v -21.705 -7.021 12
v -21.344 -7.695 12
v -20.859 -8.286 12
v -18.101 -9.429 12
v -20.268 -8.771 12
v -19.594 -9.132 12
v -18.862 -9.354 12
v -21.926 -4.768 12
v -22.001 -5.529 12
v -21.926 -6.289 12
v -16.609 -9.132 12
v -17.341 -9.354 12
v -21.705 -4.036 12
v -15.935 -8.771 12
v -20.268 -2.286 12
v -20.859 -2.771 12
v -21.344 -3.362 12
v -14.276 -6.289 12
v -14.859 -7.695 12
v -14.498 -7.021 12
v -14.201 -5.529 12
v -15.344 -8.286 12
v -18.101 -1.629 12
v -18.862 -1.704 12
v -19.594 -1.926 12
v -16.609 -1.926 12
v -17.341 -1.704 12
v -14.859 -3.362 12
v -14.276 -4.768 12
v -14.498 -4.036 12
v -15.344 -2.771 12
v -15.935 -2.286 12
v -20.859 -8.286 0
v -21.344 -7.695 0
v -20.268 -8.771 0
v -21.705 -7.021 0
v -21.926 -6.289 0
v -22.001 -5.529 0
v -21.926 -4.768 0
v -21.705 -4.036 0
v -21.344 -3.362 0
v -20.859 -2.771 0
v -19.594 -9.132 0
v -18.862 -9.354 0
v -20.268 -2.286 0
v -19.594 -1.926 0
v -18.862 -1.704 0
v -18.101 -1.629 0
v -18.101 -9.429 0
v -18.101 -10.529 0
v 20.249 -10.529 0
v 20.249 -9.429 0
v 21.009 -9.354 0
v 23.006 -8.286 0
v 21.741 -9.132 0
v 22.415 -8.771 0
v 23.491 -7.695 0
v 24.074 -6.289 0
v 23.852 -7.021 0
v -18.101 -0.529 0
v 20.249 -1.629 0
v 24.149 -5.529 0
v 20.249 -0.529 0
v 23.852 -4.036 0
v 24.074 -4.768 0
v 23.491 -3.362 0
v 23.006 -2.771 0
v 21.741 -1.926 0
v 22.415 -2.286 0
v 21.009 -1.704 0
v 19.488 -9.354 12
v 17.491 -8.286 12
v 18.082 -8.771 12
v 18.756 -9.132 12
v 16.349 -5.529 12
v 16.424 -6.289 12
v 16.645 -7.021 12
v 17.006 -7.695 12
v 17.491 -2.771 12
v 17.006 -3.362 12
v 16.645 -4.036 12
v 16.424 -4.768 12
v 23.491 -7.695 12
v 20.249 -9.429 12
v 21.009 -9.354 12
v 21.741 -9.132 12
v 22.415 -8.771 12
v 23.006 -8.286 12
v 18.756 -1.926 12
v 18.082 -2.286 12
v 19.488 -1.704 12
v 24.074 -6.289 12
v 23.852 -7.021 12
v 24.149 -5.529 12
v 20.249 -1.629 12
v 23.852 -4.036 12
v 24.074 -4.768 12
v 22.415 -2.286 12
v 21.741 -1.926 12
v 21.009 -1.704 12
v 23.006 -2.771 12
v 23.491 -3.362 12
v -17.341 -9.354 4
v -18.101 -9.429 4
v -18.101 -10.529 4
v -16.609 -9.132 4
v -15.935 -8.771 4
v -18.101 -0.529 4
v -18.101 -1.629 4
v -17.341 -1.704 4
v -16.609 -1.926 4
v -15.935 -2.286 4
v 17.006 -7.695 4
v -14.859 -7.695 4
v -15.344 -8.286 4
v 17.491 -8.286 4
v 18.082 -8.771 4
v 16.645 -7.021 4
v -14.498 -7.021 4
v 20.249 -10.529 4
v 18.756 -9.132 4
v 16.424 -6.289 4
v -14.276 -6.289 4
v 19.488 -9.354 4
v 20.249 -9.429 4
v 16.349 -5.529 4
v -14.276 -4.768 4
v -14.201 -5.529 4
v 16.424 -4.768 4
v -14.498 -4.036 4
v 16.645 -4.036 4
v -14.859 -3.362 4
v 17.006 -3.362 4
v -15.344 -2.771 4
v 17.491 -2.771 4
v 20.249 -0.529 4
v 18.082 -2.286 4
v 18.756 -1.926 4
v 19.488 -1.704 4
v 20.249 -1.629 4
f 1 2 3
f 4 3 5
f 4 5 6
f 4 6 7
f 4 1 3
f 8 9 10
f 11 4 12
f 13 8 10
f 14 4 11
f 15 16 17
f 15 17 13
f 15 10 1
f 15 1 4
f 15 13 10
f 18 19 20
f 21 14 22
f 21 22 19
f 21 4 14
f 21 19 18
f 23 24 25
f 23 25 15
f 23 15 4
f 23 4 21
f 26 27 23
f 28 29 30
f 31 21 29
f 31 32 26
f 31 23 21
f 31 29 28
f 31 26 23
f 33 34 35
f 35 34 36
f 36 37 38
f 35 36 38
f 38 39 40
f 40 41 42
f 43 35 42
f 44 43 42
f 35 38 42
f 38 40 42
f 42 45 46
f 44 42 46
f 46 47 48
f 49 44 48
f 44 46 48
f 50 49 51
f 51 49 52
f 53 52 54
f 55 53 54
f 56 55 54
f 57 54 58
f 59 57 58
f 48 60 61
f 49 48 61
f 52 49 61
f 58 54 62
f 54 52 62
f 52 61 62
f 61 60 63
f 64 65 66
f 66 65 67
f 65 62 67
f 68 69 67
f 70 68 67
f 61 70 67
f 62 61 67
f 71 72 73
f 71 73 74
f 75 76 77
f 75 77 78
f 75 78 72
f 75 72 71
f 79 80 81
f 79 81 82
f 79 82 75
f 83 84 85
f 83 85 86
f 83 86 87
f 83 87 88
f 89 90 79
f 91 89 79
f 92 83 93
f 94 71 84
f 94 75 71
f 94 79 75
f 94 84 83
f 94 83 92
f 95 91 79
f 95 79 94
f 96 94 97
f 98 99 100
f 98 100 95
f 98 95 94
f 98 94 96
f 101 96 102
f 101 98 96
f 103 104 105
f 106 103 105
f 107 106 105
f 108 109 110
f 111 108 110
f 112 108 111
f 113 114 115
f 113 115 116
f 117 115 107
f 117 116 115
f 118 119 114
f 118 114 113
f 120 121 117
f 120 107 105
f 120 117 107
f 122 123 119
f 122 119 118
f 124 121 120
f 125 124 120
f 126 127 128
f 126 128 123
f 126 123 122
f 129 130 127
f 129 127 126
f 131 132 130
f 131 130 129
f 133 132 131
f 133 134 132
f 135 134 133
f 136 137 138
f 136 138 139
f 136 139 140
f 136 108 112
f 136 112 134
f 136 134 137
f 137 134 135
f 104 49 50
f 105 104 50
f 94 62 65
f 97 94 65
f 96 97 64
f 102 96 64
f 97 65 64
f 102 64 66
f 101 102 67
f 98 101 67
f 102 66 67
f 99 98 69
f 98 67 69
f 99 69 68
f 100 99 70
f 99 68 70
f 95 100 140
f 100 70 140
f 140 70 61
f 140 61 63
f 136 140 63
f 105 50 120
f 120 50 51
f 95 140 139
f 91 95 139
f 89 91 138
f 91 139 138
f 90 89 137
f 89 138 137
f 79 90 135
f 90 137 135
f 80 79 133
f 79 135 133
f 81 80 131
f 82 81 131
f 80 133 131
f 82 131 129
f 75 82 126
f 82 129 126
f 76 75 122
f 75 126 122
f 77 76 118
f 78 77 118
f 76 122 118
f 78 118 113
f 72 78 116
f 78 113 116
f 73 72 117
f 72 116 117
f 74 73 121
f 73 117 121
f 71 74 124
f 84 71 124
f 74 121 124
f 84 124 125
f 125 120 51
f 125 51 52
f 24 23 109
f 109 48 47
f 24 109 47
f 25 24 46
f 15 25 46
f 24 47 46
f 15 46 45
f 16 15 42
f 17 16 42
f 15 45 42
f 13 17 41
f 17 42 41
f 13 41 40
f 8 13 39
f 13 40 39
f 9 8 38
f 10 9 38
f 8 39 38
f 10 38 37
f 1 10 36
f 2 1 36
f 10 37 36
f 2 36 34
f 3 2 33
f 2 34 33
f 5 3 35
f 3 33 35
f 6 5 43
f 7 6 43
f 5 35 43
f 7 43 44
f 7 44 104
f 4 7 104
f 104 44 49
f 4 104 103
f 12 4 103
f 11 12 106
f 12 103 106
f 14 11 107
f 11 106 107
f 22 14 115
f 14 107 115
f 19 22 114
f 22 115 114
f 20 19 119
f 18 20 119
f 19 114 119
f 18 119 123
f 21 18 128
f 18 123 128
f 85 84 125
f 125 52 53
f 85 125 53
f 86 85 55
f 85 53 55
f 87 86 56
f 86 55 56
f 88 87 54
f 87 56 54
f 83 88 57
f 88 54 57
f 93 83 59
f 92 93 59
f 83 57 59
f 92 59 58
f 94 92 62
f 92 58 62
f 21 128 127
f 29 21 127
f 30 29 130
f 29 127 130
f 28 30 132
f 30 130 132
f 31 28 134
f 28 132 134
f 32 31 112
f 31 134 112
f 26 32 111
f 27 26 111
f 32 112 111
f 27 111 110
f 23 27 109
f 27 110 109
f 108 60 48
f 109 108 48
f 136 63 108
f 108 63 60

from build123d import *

# Parameters (mm, degrees)
F1_DEPTH = 12
F2_DEPTH = 4


with BuildPart() as f1:
    # F0 (on Top) → F1 (new body)
    with BuildSketch(Plane.XY):
        with BuildLine():
            ThreePointArc((-14.2014003754, -5.5286388661), (-15.3436839287, -2.7709224195), (-18.1014003754, -1.6286388661))
            Line((-18.1014003754, -1.6286388661), (-18.1014003754, -9.4286388661))
            ThreePointArc((-18.1014003754, -9.4286388661), (-15.3436839287, -8.2863553127), (-14.2014003754, -5.5286388661))
        make_face()
        with BuildLine():
            Line((-18.1014003754, -9.4286388661), (-18.1014003754, -1.6286388661))
            ThreePointArc((-18.1014003754, -1.6286388661), (-22.0014003754, -5.5286388661), (-18.1014003754, -9.4286388661))
        make_face()
    extrude(amount=F1_DEPTH)



with BuildPart() as f1b:
    # F0 (on Top) → F1, piece 2 (new body)
    with BuildSketch(Plane.XY):
        with BuildLine():
            ThreePointArc((24.1485996246, -5.5286388661), (23.0063160713, -2.7709224195), (20.2485996246, -1.6286388661))
            Line((20.2485996246, -1.6286388661), (20.2485996246, -9.4286388661))
            ThreePointArc((20.2485996246, -9.4286388661), (23.0063160713, -8.2863553127), (24.1485996246, -5.5286388661))
        make_face()
        with BuildLine():
            Line((20.2485996246, -9.4286388661), (20.2485996246, -1.6286388661))
            ThreePointArc((20.2485996246, -1.6286388661), (16.3485996246, -5.5286388661), (20.2485996246, -9.4286388661))
        make_face()
    extrude(amount=F1_DEPTH)


with BuildPart() as f1_1:
    add(f1.part)

    add(f1b.part)  # F2 merges F1b
    # F0 (on Top) → F2 (join)
    with BuildSketch(Plane.XY):
        with BuildLine():
            Line((20.2485996246, -0.5286388661), (-18.1014003754, -0.5286388661))
            Line((-18.1014003754, -0.5286388661), (-18.1014003754, -1.6286388661))
            ThreePointArc((-18.1014003754, -1.6286388661), (-15.3436839287, -2.7709224195), (-14.2014003754, -5.5286388661))
            ThreePointArc((-14.2014003754, -5.5286388661), (-15.3436839287, -8.2863553127), (-18.1014003754, -9.4286388661))
            Line((-18.1014003754, -9.4286388661), (-18.1014003754, -10.5286388661))
            Line((-18.1014003754, -10.5286388661), (20.2485996246, -10.5286388661))
            Line((20.2485996246, -10.5286388661), (20.2485996246, -9.4286388661))
            ThreePointArc((20.2485996246, -9.4286388661), (16.3485996246, -5.5286388661), (20.2485996246, -1.6286388661))
            Line((20.2485996246, -1.6286388661), (20.2485996246, -0.5286388661))
        make_face()
    extrude(amount=F2_DEPTH)


solid = f1_1.part
